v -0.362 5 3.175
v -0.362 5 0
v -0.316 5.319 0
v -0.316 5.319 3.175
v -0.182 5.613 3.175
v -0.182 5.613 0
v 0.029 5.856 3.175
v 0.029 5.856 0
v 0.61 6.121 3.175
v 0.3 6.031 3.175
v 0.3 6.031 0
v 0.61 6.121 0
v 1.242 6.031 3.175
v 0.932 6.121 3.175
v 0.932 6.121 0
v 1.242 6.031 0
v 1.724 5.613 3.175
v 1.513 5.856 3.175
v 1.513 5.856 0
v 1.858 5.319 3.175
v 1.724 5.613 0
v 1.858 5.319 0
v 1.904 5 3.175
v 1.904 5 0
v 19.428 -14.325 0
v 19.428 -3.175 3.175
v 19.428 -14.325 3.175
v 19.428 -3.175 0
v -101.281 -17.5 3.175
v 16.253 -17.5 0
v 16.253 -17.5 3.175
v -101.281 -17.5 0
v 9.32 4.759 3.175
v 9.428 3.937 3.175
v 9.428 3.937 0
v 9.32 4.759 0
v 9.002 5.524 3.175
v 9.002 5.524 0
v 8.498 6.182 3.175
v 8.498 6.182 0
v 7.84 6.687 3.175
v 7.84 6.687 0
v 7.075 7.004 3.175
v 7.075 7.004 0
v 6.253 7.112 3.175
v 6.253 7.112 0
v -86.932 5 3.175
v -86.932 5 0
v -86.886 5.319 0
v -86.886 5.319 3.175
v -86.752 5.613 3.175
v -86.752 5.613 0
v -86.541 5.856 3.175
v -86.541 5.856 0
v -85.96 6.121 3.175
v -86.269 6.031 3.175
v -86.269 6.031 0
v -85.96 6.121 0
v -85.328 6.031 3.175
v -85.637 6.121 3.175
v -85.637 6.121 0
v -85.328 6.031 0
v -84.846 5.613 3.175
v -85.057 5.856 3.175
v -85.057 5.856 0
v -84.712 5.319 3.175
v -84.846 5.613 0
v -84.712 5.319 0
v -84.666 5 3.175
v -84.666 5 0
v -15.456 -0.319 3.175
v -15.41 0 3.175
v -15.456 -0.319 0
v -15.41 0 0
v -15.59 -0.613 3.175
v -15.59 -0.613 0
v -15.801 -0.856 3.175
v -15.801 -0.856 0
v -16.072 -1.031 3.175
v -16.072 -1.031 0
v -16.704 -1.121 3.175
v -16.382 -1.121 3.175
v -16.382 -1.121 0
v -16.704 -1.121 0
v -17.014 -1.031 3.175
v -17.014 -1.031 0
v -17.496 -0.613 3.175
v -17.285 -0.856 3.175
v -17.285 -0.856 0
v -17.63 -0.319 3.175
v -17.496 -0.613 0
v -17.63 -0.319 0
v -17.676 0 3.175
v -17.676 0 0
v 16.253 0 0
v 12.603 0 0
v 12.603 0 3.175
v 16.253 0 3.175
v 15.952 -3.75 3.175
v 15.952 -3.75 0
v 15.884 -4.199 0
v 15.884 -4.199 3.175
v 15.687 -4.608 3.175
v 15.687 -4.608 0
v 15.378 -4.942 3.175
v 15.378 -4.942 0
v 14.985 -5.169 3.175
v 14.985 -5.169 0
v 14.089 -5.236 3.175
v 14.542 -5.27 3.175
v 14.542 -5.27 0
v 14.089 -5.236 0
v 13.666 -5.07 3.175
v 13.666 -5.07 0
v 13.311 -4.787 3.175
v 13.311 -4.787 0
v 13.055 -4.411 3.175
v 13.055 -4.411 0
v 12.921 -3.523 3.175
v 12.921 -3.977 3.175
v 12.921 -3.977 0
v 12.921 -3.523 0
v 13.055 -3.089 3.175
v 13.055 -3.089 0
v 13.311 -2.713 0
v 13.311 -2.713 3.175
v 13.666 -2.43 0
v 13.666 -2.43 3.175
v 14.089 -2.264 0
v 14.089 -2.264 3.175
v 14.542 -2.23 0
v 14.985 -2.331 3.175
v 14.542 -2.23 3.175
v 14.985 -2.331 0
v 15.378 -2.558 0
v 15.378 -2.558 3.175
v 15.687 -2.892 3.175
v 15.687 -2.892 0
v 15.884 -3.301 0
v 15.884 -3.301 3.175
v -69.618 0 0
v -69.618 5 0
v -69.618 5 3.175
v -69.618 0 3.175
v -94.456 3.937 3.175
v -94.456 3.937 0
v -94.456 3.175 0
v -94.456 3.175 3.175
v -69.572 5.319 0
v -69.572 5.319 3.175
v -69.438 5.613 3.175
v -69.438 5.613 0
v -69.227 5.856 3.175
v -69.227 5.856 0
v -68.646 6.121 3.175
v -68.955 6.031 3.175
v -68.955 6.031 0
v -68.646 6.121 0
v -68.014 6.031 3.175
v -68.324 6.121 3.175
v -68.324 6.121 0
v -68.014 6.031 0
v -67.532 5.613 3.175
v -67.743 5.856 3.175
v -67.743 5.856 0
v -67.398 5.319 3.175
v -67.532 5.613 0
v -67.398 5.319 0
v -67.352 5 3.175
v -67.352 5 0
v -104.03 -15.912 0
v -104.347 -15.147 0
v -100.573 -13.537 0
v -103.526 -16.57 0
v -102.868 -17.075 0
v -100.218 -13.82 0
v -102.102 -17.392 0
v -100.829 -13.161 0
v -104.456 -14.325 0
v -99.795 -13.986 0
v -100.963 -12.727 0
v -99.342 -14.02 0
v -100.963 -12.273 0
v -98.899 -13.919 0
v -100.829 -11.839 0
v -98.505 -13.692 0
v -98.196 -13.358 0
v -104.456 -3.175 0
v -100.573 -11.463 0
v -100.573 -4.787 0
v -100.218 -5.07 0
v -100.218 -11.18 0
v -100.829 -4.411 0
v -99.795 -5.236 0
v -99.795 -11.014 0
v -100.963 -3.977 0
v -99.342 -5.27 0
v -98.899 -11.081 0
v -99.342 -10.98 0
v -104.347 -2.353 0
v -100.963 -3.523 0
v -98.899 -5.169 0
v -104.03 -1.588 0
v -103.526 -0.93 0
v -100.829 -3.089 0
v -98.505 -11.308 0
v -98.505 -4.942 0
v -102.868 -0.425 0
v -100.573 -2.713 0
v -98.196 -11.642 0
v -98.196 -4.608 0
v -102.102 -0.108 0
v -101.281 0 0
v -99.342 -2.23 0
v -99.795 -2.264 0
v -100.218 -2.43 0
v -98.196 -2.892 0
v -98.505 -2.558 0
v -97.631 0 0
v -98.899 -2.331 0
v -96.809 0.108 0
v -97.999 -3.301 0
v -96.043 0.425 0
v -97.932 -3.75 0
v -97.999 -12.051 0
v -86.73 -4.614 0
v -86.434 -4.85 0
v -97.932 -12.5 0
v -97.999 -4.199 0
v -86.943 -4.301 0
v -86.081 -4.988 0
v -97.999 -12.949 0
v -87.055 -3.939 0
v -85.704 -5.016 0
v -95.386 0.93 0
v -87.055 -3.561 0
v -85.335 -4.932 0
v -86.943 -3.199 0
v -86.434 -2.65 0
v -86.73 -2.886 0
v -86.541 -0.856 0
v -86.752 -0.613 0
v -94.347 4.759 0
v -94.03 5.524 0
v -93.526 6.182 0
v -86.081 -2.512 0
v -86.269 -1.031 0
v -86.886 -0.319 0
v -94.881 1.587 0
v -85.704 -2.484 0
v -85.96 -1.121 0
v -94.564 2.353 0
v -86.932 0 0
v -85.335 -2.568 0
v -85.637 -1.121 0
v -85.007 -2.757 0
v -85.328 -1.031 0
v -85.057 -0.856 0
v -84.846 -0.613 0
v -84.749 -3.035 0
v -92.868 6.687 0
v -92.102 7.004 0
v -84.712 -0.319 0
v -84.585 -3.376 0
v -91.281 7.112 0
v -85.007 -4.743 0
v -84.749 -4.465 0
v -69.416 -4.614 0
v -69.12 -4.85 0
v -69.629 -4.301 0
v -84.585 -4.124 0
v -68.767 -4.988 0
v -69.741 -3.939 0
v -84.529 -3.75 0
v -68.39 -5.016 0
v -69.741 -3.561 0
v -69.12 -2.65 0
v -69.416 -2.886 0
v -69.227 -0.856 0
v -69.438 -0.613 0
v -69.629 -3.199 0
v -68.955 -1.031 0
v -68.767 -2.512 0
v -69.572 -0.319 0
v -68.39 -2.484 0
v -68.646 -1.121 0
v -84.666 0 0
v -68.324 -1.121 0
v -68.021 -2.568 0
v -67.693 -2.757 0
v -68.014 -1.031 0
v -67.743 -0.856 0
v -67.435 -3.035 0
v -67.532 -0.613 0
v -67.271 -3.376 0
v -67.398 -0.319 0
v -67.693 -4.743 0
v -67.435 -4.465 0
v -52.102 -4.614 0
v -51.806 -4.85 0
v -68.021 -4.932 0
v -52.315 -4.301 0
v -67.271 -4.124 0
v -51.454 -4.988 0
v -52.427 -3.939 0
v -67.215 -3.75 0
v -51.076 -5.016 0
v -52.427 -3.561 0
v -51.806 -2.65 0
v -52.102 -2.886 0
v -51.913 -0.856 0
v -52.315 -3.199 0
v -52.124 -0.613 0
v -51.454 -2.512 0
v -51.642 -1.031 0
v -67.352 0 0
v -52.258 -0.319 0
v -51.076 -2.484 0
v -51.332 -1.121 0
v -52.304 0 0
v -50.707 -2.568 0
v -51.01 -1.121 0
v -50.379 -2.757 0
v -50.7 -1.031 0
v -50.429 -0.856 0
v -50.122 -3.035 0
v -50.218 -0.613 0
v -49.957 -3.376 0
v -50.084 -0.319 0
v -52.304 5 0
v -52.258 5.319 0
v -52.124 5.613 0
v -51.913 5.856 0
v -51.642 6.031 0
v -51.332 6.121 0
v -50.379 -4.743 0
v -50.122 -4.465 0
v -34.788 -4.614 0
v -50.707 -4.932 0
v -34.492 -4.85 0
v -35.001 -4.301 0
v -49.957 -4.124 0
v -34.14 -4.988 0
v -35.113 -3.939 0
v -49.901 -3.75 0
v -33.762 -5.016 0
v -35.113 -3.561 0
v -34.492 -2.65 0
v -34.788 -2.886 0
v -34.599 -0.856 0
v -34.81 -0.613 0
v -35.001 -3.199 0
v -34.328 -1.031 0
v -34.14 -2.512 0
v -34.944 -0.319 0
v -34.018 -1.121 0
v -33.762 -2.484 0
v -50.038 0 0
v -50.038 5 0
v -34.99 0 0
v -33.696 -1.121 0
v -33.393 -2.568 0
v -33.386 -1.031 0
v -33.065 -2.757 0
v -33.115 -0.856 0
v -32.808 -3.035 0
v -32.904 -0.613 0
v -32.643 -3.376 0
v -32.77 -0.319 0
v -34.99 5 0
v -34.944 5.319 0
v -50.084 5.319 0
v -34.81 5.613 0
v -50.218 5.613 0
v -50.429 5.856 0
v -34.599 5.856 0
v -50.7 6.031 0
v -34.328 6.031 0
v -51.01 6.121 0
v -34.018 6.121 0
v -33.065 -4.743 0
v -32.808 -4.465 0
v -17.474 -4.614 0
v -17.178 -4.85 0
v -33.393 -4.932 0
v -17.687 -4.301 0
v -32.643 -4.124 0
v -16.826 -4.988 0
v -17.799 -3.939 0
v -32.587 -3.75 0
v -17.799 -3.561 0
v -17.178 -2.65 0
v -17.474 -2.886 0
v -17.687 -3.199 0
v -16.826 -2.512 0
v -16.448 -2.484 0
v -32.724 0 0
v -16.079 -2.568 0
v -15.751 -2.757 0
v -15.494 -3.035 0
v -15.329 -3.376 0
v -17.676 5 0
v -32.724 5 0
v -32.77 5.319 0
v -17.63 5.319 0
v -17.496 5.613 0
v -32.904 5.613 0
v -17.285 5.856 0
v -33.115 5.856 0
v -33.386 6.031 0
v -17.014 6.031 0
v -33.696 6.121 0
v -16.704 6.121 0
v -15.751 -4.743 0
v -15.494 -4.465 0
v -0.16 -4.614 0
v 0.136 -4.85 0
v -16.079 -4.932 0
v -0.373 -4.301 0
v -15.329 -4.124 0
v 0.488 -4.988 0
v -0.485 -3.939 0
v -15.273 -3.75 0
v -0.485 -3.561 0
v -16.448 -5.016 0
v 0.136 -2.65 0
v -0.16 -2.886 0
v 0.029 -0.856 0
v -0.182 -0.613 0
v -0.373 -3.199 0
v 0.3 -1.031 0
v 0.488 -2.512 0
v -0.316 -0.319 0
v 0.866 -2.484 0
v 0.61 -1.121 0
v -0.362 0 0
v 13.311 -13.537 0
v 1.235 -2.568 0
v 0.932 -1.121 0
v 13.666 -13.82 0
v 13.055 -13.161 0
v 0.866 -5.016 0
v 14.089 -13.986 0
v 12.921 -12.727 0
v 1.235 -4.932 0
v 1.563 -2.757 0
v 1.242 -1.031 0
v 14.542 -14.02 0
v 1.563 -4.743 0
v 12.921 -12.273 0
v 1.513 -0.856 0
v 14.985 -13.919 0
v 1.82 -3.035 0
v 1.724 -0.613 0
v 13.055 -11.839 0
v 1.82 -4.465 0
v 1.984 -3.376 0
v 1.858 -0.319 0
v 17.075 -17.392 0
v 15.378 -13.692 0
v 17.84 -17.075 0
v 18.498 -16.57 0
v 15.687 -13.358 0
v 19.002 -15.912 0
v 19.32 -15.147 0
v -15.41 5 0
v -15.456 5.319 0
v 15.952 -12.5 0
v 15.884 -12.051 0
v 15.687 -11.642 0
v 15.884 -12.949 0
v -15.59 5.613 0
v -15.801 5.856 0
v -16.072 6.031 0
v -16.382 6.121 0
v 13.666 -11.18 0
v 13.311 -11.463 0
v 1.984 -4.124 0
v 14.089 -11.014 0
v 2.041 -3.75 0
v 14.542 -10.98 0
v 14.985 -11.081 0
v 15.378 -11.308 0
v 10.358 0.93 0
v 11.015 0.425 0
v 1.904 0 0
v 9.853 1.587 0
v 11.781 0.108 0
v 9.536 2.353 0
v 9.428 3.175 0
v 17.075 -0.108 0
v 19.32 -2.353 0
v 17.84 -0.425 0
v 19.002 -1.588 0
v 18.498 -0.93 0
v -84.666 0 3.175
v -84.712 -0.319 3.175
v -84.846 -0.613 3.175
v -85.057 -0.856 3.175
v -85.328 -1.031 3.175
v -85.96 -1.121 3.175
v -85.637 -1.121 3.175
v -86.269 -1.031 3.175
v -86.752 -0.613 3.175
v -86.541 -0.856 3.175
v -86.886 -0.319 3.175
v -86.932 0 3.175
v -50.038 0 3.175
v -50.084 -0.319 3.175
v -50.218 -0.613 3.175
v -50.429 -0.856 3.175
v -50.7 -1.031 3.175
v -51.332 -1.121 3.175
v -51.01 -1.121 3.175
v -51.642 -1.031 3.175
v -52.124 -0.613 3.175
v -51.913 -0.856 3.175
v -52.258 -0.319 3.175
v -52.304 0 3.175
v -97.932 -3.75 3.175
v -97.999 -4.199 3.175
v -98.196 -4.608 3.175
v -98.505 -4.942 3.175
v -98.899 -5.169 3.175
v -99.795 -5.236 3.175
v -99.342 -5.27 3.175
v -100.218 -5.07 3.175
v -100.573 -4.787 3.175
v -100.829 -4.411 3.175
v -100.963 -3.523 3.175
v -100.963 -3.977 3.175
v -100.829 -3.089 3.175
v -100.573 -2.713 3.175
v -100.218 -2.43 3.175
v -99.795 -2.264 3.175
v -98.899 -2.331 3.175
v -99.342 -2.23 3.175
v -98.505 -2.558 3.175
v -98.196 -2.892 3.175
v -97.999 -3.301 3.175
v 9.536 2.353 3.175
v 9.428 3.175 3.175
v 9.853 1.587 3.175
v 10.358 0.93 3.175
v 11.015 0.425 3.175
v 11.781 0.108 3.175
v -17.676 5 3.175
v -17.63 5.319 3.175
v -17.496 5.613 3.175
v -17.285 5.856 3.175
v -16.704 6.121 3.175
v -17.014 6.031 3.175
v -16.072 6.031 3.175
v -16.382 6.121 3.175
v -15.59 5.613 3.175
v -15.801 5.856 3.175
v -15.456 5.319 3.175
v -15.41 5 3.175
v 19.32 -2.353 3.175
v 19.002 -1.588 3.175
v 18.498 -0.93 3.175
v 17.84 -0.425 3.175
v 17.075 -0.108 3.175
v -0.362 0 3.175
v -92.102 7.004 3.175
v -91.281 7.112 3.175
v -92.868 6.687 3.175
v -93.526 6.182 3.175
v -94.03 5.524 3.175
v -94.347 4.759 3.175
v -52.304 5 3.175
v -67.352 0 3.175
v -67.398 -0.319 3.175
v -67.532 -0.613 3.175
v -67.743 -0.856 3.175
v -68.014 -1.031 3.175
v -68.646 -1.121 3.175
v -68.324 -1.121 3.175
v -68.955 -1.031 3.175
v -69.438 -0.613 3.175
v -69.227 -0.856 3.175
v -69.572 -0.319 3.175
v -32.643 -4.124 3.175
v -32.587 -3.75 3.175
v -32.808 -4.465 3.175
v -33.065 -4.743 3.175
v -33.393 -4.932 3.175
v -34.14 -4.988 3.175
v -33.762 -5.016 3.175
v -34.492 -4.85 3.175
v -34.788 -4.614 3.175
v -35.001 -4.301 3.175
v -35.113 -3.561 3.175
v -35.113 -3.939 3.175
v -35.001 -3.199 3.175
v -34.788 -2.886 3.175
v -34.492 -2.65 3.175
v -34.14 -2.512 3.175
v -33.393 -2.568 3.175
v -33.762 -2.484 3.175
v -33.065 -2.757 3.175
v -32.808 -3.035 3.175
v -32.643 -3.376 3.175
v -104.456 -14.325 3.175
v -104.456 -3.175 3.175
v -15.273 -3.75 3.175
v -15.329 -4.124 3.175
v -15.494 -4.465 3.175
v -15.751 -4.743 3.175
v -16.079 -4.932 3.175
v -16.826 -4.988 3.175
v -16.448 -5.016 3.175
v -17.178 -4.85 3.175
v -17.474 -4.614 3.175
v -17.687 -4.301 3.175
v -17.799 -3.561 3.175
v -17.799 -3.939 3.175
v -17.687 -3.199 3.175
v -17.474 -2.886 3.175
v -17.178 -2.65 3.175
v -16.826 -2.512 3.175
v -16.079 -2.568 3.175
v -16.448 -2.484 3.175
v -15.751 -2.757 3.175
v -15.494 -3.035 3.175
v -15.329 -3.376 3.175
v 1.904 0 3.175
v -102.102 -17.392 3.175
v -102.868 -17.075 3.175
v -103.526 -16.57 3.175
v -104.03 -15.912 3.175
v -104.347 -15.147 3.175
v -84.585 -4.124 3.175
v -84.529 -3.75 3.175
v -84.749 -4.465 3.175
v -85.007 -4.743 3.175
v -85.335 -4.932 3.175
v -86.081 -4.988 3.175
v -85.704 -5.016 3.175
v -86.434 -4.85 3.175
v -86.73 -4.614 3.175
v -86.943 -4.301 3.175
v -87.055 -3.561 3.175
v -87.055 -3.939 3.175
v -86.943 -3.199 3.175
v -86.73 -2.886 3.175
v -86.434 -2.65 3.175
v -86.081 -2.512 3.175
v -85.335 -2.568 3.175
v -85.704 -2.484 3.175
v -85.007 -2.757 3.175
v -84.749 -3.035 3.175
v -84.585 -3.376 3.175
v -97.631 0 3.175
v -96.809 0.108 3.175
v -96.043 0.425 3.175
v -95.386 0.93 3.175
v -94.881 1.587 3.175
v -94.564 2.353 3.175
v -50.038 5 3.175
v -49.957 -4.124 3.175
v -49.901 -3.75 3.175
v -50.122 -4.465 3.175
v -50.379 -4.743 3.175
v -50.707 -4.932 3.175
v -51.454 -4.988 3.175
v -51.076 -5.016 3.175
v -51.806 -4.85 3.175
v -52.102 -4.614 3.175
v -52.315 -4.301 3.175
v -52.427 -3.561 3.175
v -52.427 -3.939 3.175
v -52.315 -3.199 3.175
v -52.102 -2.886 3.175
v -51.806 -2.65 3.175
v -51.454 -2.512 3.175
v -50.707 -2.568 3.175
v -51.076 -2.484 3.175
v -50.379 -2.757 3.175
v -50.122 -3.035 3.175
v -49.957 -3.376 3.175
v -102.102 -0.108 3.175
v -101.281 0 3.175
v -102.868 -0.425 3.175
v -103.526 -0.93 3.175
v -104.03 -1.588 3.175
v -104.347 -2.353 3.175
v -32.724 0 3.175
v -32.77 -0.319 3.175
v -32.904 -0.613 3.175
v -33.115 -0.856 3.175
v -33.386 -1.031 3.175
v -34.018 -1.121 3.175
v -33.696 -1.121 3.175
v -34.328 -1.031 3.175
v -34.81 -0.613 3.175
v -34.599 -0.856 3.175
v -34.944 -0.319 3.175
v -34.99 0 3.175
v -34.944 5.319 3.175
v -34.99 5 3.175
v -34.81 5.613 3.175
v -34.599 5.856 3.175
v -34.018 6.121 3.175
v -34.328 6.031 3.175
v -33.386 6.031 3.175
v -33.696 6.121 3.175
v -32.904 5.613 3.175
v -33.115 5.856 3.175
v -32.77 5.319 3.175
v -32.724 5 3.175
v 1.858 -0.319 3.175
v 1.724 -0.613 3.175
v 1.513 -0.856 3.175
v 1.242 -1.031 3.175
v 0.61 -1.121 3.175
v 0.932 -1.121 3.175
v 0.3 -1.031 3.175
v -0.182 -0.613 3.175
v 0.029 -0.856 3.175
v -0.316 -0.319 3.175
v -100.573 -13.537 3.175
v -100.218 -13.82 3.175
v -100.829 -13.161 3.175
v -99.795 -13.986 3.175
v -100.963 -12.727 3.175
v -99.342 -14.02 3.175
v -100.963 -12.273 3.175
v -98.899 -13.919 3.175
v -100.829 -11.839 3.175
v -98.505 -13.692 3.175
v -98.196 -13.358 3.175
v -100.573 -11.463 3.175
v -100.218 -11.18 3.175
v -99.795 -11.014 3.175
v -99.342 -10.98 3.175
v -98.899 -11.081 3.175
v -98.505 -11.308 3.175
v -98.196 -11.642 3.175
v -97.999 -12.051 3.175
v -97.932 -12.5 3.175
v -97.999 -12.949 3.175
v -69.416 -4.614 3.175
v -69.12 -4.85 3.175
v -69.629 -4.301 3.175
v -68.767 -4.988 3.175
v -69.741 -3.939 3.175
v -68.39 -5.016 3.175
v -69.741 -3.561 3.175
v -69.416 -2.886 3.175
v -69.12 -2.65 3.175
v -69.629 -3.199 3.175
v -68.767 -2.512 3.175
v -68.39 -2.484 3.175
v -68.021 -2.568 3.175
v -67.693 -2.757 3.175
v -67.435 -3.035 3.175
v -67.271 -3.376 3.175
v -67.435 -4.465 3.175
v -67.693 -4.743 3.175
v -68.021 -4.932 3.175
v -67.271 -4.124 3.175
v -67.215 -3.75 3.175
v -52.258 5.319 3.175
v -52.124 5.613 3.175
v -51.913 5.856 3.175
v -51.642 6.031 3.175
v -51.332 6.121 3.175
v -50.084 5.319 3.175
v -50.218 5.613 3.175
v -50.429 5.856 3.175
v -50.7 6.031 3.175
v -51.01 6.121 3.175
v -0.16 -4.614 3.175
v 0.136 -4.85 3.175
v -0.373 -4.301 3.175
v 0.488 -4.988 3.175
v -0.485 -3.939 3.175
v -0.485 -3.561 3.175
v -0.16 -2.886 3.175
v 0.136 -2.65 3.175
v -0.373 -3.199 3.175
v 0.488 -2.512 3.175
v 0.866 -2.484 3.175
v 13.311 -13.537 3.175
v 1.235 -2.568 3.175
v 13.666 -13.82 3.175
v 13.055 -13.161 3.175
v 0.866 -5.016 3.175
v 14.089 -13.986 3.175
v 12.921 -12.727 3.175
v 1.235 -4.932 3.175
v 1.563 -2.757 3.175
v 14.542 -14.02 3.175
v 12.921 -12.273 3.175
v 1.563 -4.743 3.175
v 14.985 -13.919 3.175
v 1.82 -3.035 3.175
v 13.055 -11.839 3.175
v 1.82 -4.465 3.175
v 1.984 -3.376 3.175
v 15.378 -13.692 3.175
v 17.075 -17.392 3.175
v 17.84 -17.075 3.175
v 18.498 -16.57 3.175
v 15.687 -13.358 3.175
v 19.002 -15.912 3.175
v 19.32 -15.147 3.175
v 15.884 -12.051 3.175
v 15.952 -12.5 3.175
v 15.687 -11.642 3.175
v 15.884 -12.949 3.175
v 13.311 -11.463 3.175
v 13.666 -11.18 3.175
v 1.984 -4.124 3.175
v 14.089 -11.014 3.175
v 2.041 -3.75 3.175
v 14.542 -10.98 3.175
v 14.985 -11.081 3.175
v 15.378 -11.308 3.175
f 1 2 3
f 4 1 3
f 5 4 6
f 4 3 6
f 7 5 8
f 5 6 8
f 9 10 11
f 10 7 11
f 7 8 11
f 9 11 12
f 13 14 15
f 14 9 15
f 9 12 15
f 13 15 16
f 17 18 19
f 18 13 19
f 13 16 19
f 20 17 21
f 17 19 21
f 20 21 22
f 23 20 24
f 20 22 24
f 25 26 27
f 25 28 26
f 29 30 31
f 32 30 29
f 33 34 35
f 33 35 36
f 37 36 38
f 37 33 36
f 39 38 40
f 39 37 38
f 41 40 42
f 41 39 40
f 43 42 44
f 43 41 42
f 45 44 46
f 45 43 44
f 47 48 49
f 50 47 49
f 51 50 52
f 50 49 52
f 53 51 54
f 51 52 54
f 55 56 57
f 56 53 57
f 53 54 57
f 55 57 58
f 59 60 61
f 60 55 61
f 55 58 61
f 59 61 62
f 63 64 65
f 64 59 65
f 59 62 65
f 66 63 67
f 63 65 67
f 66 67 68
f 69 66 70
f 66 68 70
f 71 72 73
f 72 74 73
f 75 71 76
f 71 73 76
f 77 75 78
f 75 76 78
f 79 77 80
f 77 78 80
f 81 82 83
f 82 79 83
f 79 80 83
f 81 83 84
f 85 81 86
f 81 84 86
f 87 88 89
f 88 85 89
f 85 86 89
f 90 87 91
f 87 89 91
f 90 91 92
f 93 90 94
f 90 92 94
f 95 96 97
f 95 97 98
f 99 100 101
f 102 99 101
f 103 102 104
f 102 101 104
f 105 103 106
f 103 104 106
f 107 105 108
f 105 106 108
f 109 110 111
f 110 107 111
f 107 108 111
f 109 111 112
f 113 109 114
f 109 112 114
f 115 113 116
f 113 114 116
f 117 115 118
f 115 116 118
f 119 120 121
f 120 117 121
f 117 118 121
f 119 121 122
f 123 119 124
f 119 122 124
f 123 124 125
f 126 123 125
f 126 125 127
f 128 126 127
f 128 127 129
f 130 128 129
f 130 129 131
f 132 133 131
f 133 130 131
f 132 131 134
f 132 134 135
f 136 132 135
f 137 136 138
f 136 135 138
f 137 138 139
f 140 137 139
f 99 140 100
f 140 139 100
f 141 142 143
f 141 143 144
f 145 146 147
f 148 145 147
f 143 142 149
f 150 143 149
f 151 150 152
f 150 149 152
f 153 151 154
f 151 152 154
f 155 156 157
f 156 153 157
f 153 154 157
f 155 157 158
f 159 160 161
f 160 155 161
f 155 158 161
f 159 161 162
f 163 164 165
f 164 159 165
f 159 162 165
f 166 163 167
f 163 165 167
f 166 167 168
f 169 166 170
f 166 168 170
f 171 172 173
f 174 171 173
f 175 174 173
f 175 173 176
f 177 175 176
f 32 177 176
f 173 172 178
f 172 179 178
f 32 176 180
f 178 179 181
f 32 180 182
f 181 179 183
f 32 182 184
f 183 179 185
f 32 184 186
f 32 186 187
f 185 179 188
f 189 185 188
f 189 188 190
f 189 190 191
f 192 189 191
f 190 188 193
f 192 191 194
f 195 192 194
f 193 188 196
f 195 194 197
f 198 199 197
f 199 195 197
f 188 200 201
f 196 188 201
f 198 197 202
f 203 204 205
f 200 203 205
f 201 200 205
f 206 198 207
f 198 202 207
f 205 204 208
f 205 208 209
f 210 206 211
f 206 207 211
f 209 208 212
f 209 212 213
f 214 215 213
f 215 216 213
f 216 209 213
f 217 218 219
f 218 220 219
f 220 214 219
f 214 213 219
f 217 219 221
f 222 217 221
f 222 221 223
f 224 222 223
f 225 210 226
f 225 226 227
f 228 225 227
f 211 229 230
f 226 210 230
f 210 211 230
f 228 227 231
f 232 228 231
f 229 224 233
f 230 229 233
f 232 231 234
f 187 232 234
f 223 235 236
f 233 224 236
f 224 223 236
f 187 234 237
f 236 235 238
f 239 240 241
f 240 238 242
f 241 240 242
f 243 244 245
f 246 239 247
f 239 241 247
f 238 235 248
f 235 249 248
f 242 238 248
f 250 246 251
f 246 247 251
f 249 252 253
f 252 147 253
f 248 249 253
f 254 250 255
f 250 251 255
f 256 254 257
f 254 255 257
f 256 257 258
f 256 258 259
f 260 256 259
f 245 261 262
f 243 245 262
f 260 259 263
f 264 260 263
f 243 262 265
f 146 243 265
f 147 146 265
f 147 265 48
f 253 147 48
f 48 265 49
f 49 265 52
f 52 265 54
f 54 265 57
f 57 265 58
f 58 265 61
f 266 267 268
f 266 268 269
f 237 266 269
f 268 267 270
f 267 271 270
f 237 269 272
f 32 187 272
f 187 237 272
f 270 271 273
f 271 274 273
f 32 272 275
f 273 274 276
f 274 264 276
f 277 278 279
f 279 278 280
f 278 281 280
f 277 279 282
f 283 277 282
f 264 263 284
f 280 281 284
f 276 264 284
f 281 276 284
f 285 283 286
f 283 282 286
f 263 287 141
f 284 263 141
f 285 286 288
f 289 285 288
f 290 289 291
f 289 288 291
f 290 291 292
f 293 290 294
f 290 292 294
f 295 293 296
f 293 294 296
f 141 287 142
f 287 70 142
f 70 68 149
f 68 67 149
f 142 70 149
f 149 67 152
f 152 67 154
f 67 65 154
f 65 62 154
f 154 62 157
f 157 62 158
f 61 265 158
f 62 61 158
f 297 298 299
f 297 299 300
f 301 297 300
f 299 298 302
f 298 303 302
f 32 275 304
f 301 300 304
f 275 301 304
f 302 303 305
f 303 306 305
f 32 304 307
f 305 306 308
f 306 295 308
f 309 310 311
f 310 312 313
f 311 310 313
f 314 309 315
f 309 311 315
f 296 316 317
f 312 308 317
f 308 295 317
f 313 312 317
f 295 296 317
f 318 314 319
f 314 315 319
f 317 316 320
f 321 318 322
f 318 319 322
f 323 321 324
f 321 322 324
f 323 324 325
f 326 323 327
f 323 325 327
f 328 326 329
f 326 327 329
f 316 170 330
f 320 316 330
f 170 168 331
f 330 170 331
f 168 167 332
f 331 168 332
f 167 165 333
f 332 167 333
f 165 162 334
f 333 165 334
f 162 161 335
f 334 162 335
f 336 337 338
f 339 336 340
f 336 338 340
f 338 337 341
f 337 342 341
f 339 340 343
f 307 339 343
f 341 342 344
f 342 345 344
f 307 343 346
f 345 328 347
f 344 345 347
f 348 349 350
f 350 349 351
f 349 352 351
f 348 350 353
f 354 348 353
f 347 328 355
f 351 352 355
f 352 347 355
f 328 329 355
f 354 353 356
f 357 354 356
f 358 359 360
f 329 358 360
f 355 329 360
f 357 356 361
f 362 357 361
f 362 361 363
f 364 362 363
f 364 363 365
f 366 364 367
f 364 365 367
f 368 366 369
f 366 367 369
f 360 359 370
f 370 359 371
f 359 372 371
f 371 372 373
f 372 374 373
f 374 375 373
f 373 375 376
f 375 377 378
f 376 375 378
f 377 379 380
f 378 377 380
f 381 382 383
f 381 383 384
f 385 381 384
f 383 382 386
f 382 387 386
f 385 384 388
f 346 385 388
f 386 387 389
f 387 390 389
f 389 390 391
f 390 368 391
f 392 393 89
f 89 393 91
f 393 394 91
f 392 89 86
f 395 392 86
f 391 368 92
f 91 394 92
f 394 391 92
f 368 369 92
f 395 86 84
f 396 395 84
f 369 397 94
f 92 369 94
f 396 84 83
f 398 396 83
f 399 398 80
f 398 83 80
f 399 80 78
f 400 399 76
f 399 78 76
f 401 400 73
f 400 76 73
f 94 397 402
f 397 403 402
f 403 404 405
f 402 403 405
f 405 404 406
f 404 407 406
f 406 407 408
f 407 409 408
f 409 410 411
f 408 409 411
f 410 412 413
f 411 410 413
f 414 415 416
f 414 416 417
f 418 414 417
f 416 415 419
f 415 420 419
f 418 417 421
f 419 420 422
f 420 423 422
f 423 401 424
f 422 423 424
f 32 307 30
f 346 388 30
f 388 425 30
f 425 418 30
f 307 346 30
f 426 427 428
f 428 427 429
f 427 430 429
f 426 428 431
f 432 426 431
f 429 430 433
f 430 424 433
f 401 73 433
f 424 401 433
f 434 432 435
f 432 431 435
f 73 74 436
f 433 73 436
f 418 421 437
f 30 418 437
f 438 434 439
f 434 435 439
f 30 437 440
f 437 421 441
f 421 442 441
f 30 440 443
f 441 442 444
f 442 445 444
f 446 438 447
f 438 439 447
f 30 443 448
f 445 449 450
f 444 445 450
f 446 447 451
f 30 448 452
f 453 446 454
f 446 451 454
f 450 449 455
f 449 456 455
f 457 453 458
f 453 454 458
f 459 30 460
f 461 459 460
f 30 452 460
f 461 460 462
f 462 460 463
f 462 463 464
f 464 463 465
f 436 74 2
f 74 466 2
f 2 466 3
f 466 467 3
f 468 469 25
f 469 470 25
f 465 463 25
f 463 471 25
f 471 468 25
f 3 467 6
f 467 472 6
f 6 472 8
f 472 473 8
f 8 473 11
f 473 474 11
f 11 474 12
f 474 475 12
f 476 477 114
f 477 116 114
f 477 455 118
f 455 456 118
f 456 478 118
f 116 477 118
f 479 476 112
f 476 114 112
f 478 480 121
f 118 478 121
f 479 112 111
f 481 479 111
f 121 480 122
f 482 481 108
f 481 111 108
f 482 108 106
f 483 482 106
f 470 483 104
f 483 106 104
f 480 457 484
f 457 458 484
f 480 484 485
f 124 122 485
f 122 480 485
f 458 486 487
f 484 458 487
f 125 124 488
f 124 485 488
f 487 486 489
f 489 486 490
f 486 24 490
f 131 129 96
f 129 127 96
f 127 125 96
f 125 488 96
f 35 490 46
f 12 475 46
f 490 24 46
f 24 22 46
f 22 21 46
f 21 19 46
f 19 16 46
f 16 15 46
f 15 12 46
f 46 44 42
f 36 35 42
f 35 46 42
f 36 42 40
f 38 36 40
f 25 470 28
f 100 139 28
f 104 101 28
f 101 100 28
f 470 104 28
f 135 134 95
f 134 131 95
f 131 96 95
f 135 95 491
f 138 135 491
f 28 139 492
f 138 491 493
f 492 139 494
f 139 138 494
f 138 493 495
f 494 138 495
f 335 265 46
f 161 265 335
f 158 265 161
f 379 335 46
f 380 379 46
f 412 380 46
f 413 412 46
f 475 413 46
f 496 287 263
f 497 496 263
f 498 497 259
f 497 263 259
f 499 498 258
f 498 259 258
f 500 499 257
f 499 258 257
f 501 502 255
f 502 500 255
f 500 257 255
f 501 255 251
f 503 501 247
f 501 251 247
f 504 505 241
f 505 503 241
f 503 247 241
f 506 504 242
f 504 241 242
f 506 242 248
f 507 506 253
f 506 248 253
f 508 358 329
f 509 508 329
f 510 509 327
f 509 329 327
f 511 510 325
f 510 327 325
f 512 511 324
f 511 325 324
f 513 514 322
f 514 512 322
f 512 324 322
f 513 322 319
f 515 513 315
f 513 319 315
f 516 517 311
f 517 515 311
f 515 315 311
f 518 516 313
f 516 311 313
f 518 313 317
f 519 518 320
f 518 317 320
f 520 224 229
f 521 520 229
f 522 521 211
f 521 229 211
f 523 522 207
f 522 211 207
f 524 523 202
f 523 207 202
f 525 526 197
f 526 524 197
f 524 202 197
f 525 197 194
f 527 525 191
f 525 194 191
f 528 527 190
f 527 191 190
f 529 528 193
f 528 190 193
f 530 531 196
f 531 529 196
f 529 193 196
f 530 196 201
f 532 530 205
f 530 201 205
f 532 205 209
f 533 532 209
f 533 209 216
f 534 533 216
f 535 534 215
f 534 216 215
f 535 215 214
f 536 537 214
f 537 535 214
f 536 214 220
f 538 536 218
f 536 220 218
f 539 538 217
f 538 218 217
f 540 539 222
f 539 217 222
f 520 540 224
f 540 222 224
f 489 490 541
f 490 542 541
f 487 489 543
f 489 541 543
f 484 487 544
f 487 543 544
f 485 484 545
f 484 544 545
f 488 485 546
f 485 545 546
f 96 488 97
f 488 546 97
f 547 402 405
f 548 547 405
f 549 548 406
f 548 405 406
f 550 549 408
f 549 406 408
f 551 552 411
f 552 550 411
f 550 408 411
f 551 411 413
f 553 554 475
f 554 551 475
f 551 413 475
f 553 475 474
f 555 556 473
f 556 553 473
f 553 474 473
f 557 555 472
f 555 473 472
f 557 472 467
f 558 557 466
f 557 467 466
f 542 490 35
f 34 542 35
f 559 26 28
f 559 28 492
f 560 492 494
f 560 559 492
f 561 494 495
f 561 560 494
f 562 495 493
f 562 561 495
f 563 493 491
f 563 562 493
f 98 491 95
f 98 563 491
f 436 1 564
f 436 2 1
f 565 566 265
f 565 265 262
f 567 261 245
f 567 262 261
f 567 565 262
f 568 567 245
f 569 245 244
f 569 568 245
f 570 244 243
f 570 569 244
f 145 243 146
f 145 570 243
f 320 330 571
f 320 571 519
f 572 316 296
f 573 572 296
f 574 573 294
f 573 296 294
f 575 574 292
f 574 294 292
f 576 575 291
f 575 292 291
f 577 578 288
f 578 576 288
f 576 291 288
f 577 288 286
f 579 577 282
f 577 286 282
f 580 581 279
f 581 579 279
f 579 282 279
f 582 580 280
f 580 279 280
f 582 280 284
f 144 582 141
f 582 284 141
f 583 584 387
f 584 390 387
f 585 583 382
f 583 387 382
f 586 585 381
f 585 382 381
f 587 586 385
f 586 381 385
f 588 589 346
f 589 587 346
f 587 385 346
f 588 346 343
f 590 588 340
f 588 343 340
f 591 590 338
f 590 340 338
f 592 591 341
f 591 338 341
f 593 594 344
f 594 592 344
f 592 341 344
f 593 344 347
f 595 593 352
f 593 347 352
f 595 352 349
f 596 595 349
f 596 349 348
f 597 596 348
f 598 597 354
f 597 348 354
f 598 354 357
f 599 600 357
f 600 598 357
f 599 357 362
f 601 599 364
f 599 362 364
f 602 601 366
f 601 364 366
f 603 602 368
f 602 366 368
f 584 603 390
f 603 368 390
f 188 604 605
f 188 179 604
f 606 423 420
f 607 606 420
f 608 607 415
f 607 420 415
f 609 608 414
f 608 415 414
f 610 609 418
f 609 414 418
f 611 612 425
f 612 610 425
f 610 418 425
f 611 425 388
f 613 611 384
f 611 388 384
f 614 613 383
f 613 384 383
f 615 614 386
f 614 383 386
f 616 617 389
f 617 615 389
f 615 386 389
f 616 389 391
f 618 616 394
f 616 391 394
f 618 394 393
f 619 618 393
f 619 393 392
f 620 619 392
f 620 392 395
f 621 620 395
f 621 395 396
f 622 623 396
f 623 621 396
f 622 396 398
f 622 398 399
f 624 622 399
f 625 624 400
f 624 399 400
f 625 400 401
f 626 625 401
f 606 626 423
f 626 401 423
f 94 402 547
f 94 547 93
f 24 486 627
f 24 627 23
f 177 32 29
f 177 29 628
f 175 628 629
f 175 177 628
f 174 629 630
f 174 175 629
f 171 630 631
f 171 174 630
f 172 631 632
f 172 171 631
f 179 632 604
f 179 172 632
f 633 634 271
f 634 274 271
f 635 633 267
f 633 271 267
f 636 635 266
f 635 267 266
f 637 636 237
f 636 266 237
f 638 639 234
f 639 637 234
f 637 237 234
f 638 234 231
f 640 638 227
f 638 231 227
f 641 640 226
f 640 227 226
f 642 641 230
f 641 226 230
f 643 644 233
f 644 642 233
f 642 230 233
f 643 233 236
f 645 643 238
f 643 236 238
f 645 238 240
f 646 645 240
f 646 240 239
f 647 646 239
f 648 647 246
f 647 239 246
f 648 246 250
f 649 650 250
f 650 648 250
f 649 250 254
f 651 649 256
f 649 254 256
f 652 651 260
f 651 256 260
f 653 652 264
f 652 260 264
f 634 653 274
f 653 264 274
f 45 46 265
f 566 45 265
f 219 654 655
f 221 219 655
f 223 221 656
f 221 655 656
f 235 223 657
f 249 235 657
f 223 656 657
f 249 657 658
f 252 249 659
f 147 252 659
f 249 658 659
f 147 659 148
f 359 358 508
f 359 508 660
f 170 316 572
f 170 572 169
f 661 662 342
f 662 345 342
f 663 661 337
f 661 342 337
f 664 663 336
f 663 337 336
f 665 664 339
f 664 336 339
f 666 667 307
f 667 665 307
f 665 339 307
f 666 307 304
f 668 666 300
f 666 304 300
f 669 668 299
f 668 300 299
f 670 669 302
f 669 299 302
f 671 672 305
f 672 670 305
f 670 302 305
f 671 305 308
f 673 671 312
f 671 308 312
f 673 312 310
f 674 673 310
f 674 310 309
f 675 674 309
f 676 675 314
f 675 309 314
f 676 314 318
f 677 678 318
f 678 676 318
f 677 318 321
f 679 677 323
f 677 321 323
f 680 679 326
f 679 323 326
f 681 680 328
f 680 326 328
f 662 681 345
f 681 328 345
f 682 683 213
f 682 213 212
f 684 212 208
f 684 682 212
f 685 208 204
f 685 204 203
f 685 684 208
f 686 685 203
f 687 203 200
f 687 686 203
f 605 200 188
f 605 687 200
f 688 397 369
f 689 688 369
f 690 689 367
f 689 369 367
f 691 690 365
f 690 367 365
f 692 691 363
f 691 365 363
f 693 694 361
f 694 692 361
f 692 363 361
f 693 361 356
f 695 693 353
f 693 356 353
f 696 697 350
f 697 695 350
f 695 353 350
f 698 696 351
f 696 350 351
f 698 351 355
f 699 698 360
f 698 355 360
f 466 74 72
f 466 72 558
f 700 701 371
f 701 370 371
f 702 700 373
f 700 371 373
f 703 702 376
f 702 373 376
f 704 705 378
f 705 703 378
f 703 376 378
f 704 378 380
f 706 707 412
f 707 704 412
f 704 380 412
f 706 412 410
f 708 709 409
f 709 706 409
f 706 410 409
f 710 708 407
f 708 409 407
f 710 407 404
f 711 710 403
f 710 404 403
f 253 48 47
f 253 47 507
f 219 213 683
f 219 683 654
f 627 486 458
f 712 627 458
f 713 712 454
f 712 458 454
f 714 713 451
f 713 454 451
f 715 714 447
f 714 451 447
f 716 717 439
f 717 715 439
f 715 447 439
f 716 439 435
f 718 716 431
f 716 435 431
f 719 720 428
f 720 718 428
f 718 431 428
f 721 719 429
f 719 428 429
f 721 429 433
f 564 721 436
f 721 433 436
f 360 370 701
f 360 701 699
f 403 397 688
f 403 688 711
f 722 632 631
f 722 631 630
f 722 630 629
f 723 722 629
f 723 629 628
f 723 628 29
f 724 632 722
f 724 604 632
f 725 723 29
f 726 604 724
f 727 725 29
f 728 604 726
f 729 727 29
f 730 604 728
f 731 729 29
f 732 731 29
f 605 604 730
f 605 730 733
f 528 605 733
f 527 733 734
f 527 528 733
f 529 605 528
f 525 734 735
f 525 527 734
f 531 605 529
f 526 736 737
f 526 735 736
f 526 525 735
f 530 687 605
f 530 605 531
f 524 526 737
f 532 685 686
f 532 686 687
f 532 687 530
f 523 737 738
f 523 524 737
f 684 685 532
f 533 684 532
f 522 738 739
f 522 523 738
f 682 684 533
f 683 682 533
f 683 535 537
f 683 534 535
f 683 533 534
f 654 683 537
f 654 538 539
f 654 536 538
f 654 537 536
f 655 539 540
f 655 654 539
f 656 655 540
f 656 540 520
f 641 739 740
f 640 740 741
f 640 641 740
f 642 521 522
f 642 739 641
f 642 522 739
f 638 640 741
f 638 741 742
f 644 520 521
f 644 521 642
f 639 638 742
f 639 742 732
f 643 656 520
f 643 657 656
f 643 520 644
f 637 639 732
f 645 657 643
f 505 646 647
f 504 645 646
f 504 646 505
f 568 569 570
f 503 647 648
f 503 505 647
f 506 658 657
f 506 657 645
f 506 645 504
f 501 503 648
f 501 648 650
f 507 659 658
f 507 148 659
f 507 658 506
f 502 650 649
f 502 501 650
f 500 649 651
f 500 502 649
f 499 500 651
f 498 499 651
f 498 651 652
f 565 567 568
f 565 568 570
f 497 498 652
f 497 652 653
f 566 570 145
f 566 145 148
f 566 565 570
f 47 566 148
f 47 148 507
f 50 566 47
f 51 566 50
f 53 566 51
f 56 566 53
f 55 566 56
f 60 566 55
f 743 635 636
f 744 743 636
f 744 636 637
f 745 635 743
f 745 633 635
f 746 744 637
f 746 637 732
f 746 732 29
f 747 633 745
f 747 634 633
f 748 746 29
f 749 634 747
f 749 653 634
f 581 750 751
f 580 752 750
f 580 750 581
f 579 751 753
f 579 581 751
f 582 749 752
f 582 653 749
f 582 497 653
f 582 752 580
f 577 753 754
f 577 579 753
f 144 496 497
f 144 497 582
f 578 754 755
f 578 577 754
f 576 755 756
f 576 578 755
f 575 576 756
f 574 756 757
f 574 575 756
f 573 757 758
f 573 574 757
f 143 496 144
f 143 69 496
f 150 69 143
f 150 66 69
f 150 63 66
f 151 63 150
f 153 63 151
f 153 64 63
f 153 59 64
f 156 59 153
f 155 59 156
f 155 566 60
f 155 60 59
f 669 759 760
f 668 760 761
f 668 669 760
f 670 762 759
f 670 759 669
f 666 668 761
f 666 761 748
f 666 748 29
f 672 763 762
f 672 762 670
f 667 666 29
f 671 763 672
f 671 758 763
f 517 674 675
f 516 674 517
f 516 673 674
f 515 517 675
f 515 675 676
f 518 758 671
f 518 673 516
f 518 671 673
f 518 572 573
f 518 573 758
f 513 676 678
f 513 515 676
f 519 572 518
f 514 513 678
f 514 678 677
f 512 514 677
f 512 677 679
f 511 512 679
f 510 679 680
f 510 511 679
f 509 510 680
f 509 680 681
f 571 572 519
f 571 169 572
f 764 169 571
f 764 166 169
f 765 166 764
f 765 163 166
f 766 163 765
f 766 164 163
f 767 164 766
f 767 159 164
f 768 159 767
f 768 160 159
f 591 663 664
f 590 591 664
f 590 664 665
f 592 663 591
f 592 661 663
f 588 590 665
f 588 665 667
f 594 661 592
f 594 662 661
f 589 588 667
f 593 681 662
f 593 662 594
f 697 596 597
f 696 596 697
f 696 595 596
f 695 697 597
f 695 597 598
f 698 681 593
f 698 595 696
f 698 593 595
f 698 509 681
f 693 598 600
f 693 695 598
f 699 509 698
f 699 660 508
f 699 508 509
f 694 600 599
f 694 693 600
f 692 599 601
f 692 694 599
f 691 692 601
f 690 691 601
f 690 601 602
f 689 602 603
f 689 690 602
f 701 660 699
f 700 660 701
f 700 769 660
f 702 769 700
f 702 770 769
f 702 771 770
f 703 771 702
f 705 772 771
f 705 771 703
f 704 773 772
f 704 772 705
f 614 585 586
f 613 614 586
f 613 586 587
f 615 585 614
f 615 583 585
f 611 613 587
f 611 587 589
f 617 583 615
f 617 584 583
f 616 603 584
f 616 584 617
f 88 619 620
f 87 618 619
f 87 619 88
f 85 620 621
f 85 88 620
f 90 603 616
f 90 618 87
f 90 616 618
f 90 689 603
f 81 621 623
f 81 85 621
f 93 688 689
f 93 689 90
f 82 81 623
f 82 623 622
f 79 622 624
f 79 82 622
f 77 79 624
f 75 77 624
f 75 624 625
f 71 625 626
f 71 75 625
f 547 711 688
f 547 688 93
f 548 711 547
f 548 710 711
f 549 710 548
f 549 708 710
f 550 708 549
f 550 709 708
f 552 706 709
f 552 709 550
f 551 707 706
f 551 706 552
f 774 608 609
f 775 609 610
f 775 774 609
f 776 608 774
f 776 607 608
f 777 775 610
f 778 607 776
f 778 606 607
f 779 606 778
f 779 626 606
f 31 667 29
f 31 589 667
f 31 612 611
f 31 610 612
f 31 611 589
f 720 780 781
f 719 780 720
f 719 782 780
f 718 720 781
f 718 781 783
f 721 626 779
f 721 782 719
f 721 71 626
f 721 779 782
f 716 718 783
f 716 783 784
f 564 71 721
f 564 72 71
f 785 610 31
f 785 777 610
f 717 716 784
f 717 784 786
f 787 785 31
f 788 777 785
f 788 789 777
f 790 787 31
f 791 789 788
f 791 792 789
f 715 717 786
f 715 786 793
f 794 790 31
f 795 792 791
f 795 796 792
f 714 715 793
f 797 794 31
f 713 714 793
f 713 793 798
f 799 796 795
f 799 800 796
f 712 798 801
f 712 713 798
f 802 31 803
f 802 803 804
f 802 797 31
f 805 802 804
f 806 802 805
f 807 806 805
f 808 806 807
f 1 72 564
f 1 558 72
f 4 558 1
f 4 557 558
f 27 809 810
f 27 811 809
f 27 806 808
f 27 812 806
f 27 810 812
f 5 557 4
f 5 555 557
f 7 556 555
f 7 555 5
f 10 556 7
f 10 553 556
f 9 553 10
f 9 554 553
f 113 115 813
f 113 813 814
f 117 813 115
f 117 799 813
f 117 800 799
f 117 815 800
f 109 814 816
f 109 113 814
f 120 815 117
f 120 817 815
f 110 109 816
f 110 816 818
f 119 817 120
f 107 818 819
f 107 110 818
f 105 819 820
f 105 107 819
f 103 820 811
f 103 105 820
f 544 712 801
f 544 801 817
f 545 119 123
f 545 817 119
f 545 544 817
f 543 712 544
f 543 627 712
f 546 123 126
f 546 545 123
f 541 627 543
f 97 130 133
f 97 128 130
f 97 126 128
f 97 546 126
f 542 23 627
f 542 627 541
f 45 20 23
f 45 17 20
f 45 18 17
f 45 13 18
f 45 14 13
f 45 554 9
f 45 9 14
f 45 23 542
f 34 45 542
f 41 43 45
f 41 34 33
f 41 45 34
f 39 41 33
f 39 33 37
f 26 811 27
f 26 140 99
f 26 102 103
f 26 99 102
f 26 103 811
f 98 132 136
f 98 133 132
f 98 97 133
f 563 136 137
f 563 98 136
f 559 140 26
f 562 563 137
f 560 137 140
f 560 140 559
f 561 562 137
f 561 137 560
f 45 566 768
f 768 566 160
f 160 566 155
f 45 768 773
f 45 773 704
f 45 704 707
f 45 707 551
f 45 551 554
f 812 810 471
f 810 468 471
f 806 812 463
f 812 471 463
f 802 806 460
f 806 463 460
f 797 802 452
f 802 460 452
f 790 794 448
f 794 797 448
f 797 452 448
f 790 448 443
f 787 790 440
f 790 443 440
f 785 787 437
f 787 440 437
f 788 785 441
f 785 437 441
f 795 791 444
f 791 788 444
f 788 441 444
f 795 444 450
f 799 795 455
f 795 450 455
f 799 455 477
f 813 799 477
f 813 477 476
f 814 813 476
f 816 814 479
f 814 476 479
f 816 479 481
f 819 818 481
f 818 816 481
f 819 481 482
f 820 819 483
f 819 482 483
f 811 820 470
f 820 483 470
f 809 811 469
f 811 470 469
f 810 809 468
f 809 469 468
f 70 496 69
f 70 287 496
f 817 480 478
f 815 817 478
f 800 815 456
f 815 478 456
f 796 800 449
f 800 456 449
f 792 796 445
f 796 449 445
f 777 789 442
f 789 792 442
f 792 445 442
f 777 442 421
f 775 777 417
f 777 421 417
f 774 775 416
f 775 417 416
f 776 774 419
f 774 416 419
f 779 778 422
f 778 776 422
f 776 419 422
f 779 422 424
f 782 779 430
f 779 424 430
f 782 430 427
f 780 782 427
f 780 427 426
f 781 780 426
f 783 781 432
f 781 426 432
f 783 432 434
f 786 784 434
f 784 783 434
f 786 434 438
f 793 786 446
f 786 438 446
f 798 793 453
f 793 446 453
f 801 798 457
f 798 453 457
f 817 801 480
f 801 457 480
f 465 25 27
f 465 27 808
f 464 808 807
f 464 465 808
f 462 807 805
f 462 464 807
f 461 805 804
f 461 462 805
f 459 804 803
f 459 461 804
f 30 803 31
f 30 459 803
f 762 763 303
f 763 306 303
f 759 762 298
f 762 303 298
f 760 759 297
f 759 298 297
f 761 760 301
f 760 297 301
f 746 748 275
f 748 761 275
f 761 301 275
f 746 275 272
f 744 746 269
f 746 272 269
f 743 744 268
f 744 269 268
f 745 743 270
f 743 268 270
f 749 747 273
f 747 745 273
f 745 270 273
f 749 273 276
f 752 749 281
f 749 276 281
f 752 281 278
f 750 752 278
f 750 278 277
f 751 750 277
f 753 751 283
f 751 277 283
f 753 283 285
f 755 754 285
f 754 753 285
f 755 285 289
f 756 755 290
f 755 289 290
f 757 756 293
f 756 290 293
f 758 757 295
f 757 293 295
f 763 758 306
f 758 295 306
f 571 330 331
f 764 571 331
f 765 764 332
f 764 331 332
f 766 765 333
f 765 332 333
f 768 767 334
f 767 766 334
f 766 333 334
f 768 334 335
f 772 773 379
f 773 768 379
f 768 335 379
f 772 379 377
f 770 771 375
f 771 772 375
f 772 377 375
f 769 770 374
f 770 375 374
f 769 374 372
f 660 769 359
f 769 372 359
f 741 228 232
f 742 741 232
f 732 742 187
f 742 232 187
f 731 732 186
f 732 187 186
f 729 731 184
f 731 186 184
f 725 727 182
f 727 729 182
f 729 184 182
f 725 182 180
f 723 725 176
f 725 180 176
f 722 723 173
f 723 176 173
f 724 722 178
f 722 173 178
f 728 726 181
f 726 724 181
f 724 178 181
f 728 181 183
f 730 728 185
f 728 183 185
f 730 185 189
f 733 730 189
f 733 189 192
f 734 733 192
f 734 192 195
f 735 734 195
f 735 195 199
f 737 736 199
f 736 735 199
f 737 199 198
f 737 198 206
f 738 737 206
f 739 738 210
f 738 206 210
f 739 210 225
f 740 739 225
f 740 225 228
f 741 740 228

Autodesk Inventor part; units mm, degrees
ref_plane "YZ Plane" through (0, 0, 0) normal (1, 0, 0) x (0, 1, 0)
ref_plane "XZ Plane" through (0, 0, 0) normal (0, 1, 0) x (-1, 0, 0)
ref_plane "XY Plane" through (0, 0, 0) normal (0, 0, 1) x (1, 0, 0)
ref_plane "Work Plane1" through (-42.5139, 0, 0) normal (0, 0, 1) x (1, 0, 0)
sketch "Sketch1" plane through (-42.5139, 0, 0) normal (0, 0, 1) x (1, 0, 0)
  line L0 (-61.9417, 0) -> (61.9417, 0)
  line L1 (61.9417, 0) -> (61.9417, -14.325)
  line L2 (58.7667, -17.5) -> (-58.7667, -17.5)
  line L3 (-61.9417, -14.325) -> (-61.9417, 0)
  line L4 (-61.9417, -14.325) -> (-61.9417, -7.5) projected
  line L5 (61.9417, -7.5) -> (61.9417, -14.325) projected
  line L6 (-75.2, -7.5) -> (75.2, -7.5) projected
  line L7 (-58.7667, 0) -> (-55.1167, 0) projected
  line L8 (55.1167, 0) -> (58.7667, 0) projected
  line L9 (-58.7667, -17.5) -> (-53.0564, -17.5) projected
  line L10 (53.0564, -17.5) -> (58.7667, -17.5) projected
  arc A0 (-61.9417, -14.325) -> (-58.7667, -17.5) centre (-58.7667, -14.325) ccw
  arc A1 (58.7667, -17.5) -> (61.9417, -14.325) centre (58.7667, -14.325) ccw
  circle A2 centre (-56.9417, -3.75) radius 1.524 projected
  circle A3 centre (-56.9417, -12.5) radius 1.524 projected
  circle A4 centre (56.9417, -12.5) radius 1.524 projected
  circle A5 centre (56.9417, -3.75) radius 1.524 projected
  line L11 (-43.3353, -7.5) -> (43.3353, -7.5)
  line L12 (43.3353, -7.5) -> (43.3353, -17.5)
  line L13 (43.3353, -17.5) -> (-43.3353, -17.5)
  line L14 (-43.3353, -17.5) -> (-43.3353, -7.5)
  line L15 (-43.3353, -11.5) -> (43.3353, -11.5) projected
  line L16 (-58.7667, -17.5) -> (-53.0564, -17.5) projected
  line L17 (-58.7667, -17.5) -> (-53.0564, -17.5) projected
  line L18 (53.0564, -17.5) -> (58.7667, -17.5) projected
  line L19 (43.3353, -7.5) -> (53.0564, -17.5)
  line L20 (-53.0564, -17.5) -> (-43.3353, -7.5)
  line L21 (-56.9417, -3.75) -> (56.9417, -3.75) construction
  line L22 (-51.9417, -7.5) -> (-51.9417, -3.175) projected
  line L23 (51.9417, -3.175) -> (51.9417, -7.5) projected
  circle A6 centre (-43.2848, -3.75) radius 1.27
  circle A7 centre (-25.9709, -3.75) radius 1.27
  circle A8 centre (-8.657, -3.75) radius 1.27
  circle A9 centre (8.657, -3.75) radius 1.27
  circle A10 centre (25.9709, -3.75) radius 1.27
  circle A11 centre (43.2848, -3.75) radius 1.27
  line L24 (-51.9417, 0) -> (51.9417, 0)
  line L25 (51.9417, 0) -> (51.9417, 7.112)
  line L26 (51.9417, 7.112) -> (-51.9417, 7.112)
  line L27 (-51.9417, 7.112) -> (-51.9417, 0)
  circle A12 centre (-43.2848, 0) radius 1.133
  circle A13 centre (-43.2848, 5) radius 1.133
  line L28 (-44.4178, 5) -> (-44.4178, 0)
  line L29 (-42.1518, 0) -> (-42.1518, 5)
  circle A14 centre (-25.9709, 0) radius 1.133
  circle A15 centre (-25.9709, 5) radius 1.133
  line L30 (-27.1039, 5) -> (-27.1039, 0)
  line L31 (-24.8379, 0) -> (-24.8379, 5)
  circle A16 centre (-8.657, 0) radius 1.133
  circle A17 centre (-8.657, 5) radius 1.133
  line L32 (-9.79, 5) -> (-9.79, 0)
  line L33 (-7.524, 0) -> (-7.524, 5)
  circle A18 centre (8.657, 0) radius 1.133
  circle A19 centre (8.657, 5) radius 1.133
  line L34 (7.524, 5) -> (7.524, 0)
  line L35 (9.79, 0) -> (9.79, 5)
  circle A20 centre (25.9709, 0) radius 1.133
  circle A21 centre (25.9709, 5) radius 1.133
  line L36 (24.8379, 5) -> (24.8379, 0)
  line L37 (27.1039, 0) -> (27.1039, 5)
  circle A22 centre (43.2848, 0) radius 1.133
  circle A23 centre (43.2848, 5) radius 1.133
  line L38 (42.1518, 5) -> (42.1518, 0)
  line L39 (44.4178, 0) -> (44.4178, 5)
  point P0 (42.5139, 0)
  point P1 (0, -3.75)
  point P2 (-27.1039, 0)
  point P3 (7.524, 0)
  point P4 (24.8379, 0)
  point P5 (27.1039, 0)
  point P6 (42.1518, 0)
  point P7 (44.4178, 0)
  point P8 (27.1039, 0)
  point P9 (24.8379, 0)
  point P10 (9.79, 0)
  point P11 (7.524, 0)
  point P12 (-7.524, 0)
  point P13 (-9.79, 0)
  point P14 (-24.8379, 0)
  point P15 (-27.1039, 0)
  point P16 (-42.1518, 0)
  dimension "d1" = 3.175
  dimension "d2" = 3.75
  dimension "d5" = 2.54
  dimension "d6" = 103.8834
  dimension "d10" = 17.3139
  dimension "d15" = 8.657
  dimension "d19" = 86.5695
  dimension "d20" = 8.657
  dimension "d21" = 7.112
  dimension "d22" = 2.266
  dimension "d23" = 2.266
  dimension "d25" = 5
  dimension "d29" = 17.3139
extrude "Extrusion1" add sketch "Sketch1" along normal blind 3.175 contours L0 A12 A14 A16 A18 A20 A22 L1 L6 L3 | L6 L20 L2 A0 L3 | L27 L26 L25 L0 L39 A23 L38 L37 A21 L36 L35 A19 L34 L33 A17 L32 L31 A15 L30 L29 A13 L28 | L6 L12 L15 L14 | L14 L2 L20 | L19 L2 L12 | L6 L1 A1 L2 L19 | L15 L12 L2 L14
fillet "Fillet1" radius 3.175 6 edges at (9.4278, 0, 1.5875) (9.4278, 7.112, 1.5875) (-94.4556, 7.112, 1.5875) (-94.4556, 0, 1.5875) (-104.4556, 0, 1.5875) (19.4278, 0, 1.5875)
equation "\"d10\" = 0.166667 * d6"
equation "\"d20\" = -0.5 * d19 + 0.5 * d6"
equation "\"d23\" = d22"
equation "\"d29\" = d10"
properties part number "servo_mount_2"
